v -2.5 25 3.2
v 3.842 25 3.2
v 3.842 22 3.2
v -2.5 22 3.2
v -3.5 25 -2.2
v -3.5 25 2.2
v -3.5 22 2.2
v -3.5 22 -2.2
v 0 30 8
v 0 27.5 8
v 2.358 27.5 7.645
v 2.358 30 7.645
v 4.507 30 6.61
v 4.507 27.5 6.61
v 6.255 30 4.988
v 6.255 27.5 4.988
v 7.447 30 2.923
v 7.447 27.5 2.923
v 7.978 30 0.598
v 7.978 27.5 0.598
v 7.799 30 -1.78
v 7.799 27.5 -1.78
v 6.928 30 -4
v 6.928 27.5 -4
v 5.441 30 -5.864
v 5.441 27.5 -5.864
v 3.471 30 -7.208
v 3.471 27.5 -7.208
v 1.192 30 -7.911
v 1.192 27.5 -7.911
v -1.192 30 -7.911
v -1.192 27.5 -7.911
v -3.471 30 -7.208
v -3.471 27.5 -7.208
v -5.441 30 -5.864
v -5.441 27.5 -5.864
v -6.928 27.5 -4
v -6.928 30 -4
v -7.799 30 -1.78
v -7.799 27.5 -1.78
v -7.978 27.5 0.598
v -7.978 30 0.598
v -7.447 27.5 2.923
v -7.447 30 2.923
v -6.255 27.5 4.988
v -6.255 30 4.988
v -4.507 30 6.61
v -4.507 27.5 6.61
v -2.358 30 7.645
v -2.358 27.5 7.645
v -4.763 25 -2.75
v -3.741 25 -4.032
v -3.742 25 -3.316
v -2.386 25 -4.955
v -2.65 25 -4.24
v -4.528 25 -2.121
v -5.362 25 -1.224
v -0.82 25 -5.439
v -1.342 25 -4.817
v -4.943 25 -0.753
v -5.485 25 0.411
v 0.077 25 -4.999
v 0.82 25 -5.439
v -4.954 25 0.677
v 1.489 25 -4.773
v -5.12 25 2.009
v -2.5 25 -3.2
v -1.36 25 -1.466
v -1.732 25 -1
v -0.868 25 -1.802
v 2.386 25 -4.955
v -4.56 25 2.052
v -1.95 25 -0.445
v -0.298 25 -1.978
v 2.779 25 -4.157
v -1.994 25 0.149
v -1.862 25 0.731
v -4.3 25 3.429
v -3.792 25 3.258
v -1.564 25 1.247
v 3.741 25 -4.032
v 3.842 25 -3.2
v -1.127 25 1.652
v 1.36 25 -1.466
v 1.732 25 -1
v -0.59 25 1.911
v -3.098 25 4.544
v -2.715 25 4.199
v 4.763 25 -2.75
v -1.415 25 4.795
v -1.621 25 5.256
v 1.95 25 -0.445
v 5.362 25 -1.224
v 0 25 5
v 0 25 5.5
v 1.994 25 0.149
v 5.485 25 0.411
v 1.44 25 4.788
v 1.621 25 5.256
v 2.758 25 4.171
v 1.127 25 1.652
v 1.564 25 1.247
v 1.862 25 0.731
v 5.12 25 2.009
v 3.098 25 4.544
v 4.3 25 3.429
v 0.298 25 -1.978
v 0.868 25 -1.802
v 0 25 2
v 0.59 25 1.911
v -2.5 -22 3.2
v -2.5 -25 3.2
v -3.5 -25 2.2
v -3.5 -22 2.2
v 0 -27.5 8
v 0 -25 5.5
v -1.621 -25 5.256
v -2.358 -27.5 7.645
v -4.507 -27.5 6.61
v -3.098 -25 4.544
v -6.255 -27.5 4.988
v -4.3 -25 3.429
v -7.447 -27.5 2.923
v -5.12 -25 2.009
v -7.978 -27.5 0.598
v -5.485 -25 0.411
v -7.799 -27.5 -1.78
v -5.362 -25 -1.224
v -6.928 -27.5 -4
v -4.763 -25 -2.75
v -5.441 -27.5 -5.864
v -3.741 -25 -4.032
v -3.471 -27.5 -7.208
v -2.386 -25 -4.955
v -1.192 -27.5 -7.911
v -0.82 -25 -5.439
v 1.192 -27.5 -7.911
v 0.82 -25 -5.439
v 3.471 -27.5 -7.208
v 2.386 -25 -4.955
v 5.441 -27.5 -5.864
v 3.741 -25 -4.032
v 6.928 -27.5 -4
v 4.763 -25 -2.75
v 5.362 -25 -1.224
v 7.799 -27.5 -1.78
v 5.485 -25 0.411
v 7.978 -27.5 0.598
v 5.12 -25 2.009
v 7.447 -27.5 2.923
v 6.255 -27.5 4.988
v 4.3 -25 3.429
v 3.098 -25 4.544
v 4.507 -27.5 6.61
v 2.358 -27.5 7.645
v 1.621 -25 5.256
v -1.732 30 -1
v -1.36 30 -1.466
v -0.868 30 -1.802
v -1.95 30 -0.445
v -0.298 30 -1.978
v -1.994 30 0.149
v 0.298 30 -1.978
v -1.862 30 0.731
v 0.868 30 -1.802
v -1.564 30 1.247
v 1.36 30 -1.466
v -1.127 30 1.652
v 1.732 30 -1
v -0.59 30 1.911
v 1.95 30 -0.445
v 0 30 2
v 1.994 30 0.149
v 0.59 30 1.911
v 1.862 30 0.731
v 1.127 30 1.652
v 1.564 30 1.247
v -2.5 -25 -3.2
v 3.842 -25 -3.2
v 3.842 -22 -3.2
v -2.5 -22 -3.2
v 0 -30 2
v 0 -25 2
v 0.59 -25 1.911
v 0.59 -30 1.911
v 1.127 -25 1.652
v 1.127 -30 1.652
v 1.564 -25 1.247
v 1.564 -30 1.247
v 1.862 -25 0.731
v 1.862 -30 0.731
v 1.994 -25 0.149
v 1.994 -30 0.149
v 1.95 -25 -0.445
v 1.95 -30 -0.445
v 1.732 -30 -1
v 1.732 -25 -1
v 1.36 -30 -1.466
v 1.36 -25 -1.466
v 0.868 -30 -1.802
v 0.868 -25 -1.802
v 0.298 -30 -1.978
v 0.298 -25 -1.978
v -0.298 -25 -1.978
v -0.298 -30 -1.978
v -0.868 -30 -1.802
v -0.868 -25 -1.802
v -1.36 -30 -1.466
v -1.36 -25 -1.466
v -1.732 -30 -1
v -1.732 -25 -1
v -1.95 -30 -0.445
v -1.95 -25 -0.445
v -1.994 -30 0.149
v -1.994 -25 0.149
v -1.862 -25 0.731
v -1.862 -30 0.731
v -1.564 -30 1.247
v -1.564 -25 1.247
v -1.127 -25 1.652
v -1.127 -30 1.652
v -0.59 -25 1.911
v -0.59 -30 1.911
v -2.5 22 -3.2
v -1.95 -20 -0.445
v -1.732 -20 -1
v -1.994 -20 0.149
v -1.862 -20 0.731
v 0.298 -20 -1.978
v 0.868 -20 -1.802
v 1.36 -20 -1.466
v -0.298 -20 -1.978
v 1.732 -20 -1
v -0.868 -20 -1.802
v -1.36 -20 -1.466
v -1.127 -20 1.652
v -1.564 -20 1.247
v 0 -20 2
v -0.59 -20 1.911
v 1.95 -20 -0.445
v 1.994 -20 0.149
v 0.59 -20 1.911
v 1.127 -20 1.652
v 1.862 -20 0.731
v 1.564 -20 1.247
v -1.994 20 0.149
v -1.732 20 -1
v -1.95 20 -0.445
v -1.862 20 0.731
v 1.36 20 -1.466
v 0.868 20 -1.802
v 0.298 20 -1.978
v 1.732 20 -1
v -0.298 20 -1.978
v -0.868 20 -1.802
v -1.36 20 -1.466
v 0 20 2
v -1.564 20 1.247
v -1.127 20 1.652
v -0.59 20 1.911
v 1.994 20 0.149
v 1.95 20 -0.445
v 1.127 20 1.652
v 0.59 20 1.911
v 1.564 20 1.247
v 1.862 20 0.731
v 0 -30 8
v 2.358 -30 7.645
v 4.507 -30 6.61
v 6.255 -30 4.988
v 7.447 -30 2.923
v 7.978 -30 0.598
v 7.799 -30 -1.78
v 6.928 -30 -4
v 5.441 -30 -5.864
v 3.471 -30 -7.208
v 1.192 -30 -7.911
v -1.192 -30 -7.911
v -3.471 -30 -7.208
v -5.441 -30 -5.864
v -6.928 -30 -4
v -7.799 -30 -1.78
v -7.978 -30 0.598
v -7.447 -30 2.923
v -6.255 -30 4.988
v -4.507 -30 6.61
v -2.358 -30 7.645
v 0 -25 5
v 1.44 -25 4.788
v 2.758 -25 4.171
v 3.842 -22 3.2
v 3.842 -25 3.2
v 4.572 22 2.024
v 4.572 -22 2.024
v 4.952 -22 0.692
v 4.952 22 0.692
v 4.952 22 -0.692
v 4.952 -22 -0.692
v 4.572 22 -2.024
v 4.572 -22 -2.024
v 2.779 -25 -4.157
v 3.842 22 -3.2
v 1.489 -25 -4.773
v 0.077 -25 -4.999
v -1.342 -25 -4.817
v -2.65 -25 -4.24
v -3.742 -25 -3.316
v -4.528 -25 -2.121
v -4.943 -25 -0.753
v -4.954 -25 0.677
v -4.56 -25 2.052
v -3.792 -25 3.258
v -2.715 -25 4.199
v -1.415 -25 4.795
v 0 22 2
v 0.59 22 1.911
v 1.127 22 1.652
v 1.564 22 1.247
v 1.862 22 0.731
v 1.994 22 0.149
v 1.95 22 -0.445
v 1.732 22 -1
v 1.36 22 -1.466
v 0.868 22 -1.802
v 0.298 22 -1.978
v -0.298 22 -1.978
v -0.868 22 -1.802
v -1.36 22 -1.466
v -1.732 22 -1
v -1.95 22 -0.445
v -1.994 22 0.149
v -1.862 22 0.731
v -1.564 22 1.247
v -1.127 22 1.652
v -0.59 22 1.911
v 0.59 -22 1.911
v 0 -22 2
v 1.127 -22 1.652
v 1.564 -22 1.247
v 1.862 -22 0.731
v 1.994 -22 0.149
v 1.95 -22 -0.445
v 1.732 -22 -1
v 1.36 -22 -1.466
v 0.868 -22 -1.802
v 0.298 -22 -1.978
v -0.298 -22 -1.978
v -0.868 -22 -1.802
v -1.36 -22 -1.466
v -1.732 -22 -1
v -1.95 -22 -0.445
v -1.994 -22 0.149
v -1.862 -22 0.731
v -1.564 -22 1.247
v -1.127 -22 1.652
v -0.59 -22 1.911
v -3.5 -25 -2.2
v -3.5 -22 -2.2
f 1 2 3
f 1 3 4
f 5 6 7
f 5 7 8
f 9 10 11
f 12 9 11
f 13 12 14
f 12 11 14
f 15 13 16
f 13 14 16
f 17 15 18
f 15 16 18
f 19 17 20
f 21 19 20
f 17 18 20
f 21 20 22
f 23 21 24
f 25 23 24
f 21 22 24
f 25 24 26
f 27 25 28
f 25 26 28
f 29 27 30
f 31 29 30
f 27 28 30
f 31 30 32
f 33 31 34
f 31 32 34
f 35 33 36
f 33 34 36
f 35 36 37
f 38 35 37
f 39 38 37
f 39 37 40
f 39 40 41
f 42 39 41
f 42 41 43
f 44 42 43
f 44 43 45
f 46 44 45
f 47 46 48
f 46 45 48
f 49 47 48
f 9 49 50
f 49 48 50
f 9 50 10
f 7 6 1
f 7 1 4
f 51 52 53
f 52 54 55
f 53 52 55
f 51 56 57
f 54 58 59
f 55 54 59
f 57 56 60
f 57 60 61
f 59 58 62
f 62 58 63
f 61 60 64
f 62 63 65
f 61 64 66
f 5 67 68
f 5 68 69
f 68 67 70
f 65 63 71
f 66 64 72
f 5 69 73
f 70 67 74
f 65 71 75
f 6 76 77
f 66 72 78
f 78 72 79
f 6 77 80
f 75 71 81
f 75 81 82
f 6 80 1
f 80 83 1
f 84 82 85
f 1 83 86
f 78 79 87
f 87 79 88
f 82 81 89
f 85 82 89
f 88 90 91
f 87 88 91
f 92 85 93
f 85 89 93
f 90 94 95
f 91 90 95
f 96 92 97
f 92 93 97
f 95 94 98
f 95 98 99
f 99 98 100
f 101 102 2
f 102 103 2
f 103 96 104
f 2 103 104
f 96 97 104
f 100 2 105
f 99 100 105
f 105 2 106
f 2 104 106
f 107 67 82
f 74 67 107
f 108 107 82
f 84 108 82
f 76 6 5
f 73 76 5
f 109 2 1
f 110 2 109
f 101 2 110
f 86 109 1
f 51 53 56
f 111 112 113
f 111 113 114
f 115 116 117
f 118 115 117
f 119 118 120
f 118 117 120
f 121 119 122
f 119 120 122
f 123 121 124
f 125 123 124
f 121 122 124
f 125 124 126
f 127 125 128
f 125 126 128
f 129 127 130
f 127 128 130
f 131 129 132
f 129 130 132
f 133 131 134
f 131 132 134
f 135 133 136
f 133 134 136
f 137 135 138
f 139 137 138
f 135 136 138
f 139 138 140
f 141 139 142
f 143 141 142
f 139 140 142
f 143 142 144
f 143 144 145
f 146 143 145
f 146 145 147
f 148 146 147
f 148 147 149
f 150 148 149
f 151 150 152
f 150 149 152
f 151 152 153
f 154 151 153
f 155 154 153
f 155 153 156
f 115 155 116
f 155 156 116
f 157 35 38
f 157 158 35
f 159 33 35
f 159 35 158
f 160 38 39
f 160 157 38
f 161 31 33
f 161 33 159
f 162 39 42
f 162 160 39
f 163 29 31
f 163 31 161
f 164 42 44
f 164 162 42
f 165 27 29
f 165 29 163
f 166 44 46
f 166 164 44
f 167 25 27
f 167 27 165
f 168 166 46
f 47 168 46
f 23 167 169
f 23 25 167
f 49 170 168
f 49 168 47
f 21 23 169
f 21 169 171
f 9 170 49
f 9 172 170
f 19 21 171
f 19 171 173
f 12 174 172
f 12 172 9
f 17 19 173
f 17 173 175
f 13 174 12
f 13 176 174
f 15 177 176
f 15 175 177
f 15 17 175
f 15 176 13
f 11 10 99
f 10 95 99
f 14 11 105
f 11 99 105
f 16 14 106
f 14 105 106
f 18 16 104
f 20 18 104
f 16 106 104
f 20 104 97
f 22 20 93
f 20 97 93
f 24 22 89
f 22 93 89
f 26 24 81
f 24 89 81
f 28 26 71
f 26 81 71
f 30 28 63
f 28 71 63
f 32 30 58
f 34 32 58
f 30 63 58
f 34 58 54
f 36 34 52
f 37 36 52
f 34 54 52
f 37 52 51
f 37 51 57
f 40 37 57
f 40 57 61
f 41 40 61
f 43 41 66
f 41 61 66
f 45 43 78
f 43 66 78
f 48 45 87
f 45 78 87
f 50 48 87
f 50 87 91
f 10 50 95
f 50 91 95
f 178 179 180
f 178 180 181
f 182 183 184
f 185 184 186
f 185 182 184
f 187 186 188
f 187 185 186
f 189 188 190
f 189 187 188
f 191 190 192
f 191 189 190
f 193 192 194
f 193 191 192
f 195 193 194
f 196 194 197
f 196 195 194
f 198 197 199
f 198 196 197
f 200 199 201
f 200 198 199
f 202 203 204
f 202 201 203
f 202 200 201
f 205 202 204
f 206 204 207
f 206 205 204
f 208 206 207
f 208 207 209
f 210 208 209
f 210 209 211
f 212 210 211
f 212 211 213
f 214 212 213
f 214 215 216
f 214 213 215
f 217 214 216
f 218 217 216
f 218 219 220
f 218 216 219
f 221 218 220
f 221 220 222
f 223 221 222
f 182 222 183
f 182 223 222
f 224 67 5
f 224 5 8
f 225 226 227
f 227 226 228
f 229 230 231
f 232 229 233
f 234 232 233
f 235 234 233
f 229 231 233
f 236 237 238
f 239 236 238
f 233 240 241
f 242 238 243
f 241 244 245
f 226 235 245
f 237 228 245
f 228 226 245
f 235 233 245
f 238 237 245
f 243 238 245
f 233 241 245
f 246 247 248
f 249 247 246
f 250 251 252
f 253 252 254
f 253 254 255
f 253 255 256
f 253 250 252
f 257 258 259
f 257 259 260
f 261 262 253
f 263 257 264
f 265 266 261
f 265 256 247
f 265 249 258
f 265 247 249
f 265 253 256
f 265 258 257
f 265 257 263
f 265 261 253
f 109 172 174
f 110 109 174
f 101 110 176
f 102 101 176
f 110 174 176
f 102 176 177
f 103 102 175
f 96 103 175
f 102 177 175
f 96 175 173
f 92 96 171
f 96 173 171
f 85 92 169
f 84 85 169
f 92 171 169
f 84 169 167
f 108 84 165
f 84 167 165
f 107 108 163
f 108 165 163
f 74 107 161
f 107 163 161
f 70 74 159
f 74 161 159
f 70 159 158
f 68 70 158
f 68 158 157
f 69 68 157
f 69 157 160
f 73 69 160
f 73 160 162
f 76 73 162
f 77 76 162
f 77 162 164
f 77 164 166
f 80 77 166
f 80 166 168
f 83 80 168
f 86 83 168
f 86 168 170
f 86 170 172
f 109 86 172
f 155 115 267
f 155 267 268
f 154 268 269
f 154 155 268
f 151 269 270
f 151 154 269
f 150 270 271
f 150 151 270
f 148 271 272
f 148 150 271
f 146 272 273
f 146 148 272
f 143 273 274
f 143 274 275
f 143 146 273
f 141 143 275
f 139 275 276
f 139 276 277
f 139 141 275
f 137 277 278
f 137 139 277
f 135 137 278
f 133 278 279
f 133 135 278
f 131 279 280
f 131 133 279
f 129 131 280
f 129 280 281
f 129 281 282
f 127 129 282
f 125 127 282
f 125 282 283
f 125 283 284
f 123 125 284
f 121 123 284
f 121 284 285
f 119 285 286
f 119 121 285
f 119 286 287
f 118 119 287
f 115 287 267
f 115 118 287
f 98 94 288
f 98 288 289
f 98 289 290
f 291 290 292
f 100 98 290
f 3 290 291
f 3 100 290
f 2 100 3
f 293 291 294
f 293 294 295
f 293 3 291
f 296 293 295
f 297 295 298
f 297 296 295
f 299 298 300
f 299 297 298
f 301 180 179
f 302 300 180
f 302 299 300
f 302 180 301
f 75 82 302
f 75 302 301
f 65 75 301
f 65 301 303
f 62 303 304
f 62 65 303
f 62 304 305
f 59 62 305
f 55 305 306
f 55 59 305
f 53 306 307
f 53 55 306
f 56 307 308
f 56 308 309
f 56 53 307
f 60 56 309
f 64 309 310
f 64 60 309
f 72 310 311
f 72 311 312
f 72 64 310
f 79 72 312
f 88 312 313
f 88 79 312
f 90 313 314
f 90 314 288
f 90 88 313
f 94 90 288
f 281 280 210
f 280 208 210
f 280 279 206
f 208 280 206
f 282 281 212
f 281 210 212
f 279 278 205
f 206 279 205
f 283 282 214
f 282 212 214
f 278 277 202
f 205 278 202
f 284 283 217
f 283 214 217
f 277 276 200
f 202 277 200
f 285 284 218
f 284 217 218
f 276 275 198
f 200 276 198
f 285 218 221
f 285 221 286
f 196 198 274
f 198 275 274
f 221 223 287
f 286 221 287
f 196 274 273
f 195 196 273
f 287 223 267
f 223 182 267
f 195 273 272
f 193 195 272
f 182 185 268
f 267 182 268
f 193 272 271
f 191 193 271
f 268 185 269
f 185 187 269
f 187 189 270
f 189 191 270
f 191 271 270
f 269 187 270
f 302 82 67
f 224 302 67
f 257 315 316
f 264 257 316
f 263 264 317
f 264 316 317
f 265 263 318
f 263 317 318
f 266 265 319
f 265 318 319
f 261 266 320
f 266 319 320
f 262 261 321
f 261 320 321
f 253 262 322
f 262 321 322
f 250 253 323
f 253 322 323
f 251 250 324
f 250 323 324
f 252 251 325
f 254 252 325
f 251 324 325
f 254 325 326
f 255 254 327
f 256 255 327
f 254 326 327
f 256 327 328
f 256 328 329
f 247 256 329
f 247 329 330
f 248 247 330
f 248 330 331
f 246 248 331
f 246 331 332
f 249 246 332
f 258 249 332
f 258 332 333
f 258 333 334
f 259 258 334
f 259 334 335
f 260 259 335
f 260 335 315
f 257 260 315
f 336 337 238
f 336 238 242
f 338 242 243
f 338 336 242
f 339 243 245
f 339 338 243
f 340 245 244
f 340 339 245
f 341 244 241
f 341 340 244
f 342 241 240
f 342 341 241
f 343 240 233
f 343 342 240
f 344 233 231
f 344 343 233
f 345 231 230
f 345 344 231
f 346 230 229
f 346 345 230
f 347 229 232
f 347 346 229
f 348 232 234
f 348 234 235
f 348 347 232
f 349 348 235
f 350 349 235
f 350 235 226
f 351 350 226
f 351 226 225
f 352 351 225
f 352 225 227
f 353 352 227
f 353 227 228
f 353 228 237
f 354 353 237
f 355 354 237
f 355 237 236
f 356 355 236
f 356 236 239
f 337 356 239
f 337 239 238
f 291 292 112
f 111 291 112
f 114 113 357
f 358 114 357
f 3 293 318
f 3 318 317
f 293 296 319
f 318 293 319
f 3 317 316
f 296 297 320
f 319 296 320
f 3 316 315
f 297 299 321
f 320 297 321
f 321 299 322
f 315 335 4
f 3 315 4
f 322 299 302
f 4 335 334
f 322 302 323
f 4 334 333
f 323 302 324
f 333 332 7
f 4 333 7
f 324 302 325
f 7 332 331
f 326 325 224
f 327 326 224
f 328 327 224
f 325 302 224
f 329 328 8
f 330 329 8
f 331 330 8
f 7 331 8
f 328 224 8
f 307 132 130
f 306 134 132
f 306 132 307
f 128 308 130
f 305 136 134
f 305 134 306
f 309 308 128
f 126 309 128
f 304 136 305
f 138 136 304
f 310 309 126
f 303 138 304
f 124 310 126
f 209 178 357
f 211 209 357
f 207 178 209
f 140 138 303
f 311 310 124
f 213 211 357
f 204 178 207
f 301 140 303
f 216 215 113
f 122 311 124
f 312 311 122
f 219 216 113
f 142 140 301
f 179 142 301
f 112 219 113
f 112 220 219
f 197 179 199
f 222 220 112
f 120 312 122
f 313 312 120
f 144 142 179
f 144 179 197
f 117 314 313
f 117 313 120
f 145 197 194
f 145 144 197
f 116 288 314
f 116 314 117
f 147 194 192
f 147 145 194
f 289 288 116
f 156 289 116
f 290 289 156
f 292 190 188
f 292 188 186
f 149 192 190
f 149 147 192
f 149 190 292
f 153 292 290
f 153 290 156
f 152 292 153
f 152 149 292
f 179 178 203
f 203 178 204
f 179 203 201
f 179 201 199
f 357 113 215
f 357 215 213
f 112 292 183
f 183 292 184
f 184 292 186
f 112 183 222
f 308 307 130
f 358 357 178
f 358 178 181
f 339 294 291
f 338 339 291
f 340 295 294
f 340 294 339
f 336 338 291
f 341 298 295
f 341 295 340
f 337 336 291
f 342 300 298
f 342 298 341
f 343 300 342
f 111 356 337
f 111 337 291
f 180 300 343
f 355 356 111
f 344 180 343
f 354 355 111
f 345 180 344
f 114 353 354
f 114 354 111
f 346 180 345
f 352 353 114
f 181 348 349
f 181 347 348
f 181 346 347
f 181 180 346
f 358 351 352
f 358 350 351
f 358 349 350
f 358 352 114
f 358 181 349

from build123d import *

# Parameters (mm, degrees)
SKETCH1_R                = 5
BOSS_EXTRUDE1_DEPTH      = 25
SKETCH2_R                = 8
BOSS_EXTRUDE2_DEPTH      = 5
CHAMFER2_SIZE            = 2.5
SKETCH3_R                = 2
CUT_EXTRUDE1_DEPTH       = 10
SKETCH6_W                = 14.643635598
SKETCH6_H                = 6.4
CUT_EXTRUDE2_DEPTH       = 3
CHAMFER4_SIZE            = 1
CHAMFER2_OF_MIRROR4_SIZE = 2.5
CHAMFER4_OF_MIRROR4_SIZE = 1


with BuildPart() as part:
    # Sketch1 → Boss-Extrude1 (new, symmetric)
    with BuildSketch(Plane(origin=(0, 0, 0), x_dir=(1, 0, 0), z_dir=(0, 1, 0))):
        with Locations(Location((0, 0, 0), (0, 0, 270))):
            Circle(SKETCH1_R)
    extrude(amount=BOSS_EXTRUDE1_DEPTH, both=True)

    # Sketch2 → Boss-Extrude2 (add)
    with BuildSketch(Plane(origin=(0, 25, 0), x_dir=(1, 0, 0), z_dir=(0, 1, 0))):
        with Locations(Location((0, 0, 0), (0, 0, 270))):
            Circle(SKETCH2_R)
    boss_extrude2 = extrude(amount=BOSS_EXTRUDE2_DEPTH)

    # Chamfer2
    chamfer2_edges = [part.edges().sort_by_distance(p)[0] for p in [
        (0, 25, -8),
    ]]
    chamfer(chamfer2_edges, length=CHAMFER2_SIZE)

    # Sketch3 → Cut-Extrude1 (cut)
    with BuildSketch(Plane(origin=(0, 30, 0), x_dir=(1, 0, 0), z_dir=(0, 1, 0))):
        with Locations(Location((0, 0, 0), (0, 0, 270))):
            Circle(SKETCH3_R)
    cut_extrude1 = extrude(amount=-CUT_EXTRUDE1_DEPTH, mode=Mode.SUBTRACT)

    # Sketch6 → Cut-Extrude2 (cut)
    with BuildSketch(Plane(origin=(0, 25, 0), x_dir=(-1, 0, 0), z_dir=(0, -1, 0))):
        with Locations((-3.821817799, 0)):
            Rectangle(SKETCH6_W, SKETCH6_H)
    cut_extrude2 = extrude(amount=CUT_EXTRUDE2_DEPTH, mode=Mode.SUBTRACT)

    # Chamfer4
    chamfer4_edges = [part.edges().sort_by_distance(p)[0] for p in [
        (-3.5, 23.5, -3.2),
        (-3.5, 23.5, 3.2),
    ]]
    chamfer(chamfer4_edges, length=CHAMFER4_SIZE)

    # Mirror4: Boss-Extrude2, Cut-Extrude1, Cut-Extrude2 across plane
    add(boss_extrude2.mirror(Plane(origin=(0, 0, 0), x_dir=(0, 0, 1), z_dir=(0, -1, 0))))
    add(cut_extrude1.mirror(Plane(origin=(0, 0, 0), x_dir=(0, 0, 1), z_dir=(0, -1, 0))), mode=Mode.SUBTRACT)
    add(cut_extrude2.mirror(Plane(origin=(0, 0, 0), x_dir=(0, 0, 1), z_dir=(0, -1, 0))), mode=Mode.SUBTRACT)

    # Chamfer2 of Mirror4
    chamfer2_of_mirror4_edges = [part.edges().sort_by_distance(p)[0] for p in [
        (0, -25, -8),
    ]]
    chamfer(chamfer2_of_mirror4_edges, length=CHAMFER2_OF_MIRROR4_SIZE)

    # Chamfer4 of Mirror4
    chamfer4_of_mirror4_edges = [part.edges().sort_by_distance(p)[0] for p in [
        (-3.5, -23.5, -3.2),
        (-3.5, -23.5, 3.2),
    ]]
    chamfer(chamfer4_of_mirror4_edges, length=CHAMFER4_OF_MIRROR4_SIZE)


solid = part.part
